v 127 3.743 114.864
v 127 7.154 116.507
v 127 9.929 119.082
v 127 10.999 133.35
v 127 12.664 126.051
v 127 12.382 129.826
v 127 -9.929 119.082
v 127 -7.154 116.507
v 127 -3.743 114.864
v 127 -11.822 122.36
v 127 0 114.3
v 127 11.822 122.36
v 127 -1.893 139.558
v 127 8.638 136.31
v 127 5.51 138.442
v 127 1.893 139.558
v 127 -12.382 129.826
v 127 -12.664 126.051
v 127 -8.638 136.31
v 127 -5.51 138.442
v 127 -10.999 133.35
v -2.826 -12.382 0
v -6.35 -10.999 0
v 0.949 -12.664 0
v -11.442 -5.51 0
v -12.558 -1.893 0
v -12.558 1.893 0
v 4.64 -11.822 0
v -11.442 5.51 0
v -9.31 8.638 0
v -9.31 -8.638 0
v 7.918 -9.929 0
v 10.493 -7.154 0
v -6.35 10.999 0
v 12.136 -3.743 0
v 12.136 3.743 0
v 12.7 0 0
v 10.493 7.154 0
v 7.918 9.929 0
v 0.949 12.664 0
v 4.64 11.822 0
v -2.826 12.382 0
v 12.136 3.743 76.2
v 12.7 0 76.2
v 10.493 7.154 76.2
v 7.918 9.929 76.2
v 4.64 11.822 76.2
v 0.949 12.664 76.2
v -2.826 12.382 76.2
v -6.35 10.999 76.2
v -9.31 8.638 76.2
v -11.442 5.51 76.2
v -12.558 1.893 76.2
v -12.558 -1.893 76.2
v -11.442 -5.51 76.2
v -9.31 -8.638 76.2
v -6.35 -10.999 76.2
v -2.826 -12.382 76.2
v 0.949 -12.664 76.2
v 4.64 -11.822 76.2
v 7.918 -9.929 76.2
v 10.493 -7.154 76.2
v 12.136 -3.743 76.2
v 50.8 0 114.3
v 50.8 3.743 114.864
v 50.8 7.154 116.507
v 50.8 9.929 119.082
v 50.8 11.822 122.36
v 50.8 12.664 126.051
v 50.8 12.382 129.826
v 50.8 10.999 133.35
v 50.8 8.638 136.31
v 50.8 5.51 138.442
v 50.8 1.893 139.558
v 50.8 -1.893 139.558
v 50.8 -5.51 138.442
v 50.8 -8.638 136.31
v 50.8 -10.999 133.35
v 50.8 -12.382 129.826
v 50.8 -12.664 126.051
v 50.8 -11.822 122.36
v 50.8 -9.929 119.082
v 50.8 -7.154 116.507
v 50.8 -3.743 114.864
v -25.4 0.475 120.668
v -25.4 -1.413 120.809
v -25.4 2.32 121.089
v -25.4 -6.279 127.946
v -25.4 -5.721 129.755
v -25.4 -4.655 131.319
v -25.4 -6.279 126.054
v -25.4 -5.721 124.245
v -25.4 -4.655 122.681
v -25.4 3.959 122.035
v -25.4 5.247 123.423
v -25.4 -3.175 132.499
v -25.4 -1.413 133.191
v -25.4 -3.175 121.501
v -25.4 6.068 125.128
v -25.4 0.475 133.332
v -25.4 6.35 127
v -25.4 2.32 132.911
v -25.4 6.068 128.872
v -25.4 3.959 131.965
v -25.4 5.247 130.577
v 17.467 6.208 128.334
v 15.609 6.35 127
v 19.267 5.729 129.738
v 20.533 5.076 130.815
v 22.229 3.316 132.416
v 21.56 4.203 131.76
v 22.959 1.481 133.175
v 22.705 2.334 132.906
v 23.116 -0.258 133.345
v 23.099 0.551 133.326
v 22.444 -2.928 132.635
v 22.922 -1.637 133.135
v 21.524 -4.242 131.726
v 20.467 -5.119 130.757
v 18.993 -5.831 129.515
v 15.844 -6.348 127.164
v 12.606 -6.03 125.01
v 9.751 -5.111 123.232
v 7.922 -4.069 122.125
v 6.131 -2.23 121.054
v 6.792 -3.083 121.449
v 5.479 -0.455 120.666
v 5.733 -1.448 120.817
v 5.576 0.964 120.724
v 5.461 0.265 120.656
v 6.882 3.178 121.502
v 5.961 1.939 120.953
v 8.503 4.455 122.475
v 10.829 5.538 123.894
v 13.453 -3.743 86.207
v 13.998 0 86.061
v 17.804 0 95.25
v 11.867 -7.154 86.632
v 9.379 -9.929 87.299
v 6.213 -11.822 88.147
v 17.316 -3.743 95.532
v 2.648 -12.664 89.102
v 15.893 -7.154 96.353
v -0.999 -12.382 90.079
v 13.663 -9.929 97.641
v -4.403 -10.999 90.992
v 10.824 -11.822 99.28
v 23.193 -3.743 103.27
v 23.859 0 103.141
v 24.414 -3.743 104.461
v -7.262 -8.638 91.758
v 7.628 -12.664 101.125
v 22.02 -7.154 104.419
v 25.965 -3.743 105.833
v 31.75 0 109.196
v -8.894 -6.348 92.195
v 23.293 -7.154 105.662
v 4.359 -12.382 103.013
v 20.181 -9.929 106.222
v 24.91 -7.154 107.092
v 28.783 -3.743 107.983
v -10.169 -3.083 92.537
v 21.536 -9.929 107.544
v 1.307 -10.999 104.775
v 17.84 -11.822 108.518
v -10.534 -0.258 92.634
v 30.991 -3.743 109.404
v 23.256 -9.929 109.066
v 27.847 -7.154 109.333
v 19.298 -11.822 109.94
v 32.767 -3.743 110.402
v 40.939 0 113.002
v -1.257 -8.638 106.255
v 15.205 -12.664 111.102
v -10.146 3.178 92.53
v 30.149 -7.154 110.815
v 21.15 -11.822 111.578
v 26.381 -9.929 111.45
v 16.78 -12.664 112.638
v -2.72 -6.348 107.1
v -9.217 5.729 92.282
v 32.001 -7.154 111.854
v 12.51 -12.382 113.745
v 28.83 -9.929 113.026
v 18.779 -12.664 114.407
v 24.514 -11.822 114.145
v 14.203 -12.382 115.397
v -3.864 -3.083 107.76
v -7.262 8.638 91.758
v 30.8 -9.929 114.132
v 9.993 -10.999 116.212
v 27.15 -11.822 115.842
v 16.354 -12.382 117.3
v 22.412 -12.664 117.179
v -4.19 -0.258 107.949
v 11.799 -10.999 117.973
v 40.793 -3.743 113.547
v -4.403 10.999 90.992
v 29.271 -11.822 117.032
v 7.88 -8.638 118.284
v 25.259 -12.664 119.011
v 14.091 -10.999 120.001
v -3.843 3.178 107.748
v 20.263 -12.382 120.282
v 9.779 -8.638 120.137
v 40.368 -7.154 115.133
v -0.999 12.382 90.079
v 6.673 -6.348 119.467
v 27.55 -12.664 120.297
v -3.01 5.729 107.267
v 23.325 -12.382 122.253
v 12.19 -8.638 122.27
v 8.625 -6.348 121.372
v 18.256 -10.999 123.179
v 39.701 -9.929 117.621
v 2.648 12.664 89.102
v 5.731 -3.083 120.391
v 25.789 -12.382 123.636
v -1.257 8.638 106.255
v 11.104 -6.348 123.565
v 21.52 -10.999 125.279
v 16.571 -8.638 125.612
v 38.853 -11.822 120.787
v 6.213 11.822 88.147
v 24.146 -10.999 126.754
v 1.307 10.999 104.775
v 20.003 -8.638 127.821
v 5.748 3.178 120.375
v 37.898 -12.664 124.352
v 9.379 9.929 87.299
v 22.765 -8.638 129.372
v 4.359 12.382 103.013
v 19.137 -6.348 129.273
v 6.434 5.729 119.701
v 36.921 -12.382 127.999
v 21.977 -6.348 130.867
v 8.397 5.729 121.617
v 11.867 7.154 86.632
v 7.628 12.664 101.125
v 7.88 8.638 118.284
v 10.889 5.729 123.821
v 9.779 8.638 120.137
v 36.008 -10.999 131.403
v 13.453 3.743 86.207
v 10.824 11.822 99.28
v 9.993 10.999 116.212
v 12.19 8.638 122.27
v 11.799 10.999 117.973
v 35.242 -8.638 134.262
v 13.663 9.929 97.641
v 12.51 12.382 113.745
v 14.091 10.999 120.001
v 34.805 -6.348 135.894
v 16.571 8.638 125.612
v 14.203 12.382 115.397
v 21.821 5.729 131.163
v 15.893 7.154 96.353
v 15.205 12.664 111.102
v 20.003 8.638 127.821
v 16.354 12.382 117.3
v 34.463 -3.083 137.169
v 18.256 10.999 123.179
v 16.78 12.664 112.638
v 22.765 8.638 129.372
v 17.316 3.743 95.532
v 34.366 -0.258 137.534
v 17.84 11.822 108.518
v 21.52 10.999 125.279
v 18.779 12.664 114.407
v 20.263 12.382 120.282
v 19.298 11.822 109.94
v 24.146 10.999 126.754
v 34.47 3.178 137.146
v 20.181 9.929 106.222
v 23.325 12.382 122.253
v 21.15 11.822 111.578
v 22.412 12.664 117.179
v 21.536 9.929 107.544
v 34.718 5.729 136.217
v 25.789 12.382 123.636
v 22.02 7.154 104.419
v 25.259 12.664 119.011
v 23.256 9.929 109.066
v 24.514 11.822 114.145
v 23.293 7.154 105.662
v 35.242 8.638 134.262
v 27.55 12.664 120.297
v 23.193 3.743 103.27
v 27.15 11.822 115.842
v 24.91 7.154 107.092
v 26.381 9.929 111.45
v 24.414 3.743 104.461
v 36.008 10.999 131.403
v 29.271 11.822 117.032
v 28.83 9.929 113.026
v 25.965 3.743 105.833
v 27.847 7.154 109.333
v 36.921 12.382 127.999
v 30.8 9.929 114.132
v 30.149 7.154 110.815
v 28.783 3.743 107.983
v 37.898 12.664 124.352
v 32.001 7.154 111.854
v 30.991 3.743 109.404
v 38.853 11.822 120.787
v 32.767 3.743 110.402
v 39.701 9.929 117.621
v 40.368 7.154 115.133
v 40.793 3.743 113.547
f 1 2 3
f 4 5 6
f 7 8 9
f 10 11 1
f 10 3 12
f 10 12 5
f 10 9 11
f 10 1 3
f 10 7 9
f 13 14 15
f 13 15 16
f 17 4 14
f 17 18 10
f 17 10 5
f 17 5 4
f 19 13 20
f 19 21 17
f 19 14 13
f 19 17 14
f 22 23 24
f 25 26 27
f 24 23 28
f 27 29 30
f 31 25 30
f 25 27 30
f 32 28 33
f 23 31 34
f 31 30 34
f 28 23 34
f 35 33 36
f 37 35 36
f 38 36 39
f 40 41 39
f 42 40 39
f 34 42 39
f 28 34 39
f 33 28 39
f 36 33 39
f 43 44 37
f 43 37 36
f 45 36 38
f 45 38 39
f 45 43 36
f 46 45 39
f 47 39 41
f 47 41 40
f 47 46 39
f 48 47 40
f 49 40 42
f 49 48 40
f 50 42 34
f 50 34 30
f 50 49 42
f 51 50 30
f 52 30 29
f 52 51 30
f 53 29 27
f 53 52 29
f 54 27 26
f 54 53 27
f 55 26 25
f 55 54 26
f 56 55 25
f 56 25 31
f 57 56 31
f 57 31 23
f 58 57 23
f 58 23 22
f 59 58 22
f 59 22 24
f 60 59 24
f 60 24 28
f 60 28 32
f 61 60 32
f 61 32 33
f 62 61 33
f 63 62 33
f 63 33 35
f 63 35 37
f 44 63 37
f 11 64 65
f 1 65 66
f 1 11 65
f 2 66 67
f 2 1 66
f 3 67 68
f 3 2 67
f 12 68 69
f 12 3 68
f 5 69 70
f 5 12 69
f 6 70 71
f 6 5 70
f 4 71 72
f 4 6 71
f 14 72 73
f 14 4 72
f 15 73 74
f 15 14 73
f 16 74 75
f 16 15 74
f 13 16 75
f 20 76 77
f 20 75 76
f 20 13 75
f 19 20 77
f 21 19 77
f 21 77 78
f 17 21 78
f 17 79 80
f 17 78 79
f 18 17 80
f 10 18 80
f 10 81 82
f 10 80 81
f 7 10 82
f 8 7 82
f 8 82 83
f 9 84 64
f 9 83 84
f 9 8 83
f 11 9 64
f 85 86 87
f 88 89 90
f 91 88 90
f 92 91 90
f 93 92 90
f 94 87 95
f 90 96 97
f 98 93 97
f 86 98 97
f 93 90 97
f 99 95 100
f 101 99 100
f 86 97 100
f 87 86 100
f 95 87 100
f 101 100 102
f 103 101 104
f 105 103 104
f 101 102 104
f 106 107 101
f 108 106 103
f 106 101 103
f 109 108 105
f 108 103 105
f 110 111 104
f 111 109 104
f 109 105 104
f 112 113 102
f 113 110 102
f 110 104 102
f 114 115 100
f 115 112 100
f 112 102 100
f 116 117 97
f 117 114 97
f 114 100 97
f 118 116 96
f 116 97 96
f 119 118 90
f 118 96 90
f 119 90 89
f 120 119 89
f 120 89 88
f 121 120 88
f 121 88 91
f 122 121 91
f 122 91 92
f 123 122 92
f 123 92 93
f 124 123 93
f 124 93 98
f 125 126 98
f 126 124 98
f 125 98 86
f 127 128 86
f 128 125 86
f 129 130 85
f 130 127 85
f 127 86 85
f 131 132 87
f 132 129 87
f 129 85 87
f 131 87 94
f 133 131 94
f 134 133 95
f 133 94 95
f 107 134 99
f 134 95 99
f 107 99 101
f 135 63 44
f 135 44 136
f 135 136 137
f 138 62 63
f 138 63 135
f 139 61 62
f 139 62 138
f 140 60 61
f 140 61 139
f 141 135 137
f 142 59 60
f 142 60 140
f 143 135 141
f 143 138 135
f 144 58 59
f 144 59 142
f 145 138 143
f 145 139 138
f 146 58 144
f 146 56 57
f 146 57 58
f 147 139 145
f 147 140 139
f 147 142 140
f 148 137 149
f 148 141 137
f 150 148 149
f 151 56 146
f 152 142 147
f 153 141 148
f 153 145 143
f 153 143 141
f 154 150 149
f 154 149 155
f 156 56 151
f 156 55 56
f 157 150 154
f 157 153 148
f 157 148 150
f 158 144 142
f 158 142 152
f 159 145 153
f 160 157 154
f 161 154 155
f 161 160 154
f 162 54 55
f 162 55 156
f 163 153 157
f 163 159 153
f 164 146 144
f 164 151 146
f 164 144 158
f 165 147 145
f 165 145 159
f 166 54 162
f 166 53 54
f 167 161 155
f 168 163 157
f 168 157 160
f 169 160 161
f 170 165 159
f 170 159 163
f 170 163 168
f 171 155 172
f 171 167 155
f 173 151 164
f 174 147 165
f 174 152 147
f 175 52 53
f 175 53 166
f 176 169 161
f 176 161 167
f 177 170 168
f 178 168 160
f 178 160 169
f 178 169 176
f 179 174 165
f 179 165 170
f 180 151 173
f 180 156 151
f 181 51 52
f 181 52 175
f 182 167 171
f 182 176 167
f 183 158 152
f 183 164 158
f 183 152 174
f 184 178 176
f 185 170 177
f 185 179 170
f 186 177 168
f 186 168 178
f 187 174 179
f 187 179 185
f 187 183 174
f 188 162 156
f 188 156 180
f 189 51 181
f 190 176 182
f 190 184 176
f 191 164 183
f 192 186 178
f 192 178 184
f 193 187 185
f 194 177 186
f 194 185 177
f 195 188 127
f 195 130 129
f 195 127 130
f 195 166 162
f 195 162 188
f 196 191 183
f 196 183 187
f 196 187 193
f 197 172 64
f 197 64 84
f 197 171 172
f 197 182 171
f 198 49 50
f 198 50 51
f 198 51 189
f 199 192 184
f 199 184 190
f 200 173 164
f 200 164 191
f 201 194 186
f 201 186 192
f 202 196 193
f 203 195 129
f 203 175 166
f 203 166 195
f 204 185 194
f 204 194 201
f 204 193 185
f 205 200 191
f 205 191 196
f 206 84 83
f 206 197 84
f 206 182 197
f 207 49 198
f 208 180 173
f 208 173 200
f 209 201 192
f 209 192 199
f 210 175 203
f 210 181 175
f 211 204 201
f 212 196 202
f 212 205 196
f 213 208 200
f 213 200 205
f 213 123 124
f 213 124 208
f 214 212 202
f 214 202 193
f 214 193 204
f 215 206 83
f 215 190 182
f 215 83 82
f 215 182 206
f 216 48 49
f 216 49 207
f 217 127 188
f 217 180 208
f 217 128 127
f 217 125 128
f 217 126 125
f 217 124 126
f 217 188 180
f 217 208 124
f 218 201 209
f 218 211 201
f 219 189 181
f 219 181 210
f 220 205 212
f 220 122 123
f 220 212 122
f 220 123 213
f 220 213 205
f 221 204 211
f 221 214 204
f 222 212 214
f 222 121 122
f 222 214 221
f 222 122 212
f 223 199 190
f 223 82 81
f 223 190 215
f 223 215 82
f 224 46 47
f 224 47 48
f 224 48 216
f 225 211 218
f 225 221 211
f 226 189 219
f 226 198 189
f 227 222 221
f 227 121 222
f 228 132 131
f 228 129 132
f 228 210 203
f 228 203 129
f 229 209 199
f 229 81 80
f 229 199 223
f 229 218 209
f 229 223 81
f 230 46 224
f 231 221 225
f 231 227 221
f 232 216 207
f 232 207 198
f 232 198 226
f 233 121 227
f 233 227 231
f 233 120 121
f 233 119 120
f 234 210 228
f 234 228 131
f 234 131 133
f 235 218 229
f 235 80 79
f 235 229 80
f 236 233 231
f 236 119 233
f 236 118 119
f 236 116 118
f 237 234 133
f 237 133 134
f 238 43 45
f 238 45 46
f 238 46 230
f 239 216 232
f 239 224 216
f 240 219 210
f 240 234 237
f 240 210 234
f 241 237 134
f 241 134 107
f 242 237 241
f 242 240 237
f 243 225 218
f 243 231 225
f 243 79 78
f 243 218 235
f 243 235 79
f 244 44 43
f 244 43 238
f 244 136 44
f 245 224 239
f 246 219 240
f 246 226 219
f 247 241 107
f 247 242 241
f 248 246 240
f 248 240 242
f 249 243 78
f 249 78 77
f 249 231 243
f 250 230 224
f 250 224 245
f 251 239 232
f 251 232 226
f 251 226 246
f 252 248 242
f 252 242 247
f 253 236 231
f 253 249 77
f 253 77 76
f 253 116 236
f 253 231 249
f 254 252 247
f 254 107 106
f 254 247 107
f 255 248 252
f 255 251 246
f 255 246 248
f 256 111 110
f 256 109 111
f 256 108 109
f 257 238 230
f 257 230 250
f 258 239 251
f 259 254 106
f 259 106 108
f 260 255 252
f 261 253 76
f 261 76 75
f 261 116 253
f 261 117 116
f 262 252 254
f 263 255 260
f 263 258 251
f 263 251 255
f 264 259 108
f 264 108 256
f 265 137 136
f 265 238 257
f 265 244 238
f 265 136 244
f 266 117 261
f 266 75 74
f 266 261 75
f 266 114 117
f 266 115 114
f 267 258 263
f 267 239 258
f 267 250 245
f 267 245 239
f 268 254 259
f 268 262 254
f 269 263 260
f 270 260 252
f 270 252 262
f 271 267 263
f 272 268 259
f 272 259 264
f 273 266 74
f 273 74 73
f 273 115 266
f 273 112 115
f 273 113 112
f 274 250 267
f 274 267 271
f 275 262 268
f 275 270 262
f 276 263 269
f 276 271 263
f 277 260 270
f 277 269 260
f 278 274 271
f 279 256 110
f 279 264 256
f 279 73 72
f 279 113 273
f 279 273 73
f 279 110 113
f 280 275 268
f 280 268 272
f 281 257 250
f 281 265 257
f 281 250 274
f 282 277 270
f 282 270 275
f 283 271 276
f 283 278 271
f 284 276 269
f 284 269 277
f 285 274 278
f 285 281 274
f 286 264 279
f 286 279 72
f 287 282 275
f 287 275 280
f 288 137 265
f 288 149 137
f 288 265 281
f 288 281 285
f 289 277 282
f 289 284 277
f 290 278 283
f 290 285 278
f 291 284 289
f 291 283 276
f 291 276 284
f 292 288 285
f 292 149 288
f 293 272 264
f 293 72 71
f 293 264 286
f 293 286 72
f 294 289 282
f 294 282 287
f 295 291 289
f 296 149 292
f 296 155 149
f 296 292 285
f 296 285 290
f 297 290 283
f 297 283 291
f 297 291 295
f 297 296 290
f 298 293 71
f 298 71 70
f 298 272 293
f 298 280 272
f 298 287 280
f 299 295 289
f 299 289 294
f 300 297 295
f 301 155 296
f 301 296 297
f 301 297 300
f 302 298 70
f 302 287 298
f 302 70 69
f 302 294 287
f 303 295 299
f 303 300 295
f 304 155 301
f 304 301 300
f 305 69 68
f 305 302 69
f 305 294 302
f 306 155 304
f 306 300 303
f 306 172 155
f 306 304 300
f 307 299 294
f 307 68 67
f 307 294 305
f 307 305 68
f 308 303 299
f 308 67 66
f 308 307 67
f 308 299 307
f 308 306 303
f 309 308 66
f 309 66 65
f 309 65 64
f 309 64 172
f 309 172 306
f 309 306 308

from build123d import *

# Parameters (mm, degrees)
F1_R     = 12.7
F4_R     = 6.35
F5_DEPTH = 75


with BuildPart() as f2:
    # F2: sweep along a path in F0
    with BuildLine(Plane.XZ) as f2_path:
        Line((0, 0), (0, 76.2))
        ThreePointArc((0, 76.2), (14.8789755157, 112.1210244843), (50.8, 127))
        Line((50.8, 127), (127, 127))
    # F1 (on Top) → F2 (sweep)
    with BuildSketch(Plane.XY):
        Circle(F1_R)
    sweep(path=f2_path.line)

    # F4 (on offset) → F5 (join)
    with BuildSketch(Plane.YZ.offset(-25.4)):
        with Locations((0, 127)):
            Circle(F4_R)
    extrude(amount=F5_DEPTH)


solid = f2.part
